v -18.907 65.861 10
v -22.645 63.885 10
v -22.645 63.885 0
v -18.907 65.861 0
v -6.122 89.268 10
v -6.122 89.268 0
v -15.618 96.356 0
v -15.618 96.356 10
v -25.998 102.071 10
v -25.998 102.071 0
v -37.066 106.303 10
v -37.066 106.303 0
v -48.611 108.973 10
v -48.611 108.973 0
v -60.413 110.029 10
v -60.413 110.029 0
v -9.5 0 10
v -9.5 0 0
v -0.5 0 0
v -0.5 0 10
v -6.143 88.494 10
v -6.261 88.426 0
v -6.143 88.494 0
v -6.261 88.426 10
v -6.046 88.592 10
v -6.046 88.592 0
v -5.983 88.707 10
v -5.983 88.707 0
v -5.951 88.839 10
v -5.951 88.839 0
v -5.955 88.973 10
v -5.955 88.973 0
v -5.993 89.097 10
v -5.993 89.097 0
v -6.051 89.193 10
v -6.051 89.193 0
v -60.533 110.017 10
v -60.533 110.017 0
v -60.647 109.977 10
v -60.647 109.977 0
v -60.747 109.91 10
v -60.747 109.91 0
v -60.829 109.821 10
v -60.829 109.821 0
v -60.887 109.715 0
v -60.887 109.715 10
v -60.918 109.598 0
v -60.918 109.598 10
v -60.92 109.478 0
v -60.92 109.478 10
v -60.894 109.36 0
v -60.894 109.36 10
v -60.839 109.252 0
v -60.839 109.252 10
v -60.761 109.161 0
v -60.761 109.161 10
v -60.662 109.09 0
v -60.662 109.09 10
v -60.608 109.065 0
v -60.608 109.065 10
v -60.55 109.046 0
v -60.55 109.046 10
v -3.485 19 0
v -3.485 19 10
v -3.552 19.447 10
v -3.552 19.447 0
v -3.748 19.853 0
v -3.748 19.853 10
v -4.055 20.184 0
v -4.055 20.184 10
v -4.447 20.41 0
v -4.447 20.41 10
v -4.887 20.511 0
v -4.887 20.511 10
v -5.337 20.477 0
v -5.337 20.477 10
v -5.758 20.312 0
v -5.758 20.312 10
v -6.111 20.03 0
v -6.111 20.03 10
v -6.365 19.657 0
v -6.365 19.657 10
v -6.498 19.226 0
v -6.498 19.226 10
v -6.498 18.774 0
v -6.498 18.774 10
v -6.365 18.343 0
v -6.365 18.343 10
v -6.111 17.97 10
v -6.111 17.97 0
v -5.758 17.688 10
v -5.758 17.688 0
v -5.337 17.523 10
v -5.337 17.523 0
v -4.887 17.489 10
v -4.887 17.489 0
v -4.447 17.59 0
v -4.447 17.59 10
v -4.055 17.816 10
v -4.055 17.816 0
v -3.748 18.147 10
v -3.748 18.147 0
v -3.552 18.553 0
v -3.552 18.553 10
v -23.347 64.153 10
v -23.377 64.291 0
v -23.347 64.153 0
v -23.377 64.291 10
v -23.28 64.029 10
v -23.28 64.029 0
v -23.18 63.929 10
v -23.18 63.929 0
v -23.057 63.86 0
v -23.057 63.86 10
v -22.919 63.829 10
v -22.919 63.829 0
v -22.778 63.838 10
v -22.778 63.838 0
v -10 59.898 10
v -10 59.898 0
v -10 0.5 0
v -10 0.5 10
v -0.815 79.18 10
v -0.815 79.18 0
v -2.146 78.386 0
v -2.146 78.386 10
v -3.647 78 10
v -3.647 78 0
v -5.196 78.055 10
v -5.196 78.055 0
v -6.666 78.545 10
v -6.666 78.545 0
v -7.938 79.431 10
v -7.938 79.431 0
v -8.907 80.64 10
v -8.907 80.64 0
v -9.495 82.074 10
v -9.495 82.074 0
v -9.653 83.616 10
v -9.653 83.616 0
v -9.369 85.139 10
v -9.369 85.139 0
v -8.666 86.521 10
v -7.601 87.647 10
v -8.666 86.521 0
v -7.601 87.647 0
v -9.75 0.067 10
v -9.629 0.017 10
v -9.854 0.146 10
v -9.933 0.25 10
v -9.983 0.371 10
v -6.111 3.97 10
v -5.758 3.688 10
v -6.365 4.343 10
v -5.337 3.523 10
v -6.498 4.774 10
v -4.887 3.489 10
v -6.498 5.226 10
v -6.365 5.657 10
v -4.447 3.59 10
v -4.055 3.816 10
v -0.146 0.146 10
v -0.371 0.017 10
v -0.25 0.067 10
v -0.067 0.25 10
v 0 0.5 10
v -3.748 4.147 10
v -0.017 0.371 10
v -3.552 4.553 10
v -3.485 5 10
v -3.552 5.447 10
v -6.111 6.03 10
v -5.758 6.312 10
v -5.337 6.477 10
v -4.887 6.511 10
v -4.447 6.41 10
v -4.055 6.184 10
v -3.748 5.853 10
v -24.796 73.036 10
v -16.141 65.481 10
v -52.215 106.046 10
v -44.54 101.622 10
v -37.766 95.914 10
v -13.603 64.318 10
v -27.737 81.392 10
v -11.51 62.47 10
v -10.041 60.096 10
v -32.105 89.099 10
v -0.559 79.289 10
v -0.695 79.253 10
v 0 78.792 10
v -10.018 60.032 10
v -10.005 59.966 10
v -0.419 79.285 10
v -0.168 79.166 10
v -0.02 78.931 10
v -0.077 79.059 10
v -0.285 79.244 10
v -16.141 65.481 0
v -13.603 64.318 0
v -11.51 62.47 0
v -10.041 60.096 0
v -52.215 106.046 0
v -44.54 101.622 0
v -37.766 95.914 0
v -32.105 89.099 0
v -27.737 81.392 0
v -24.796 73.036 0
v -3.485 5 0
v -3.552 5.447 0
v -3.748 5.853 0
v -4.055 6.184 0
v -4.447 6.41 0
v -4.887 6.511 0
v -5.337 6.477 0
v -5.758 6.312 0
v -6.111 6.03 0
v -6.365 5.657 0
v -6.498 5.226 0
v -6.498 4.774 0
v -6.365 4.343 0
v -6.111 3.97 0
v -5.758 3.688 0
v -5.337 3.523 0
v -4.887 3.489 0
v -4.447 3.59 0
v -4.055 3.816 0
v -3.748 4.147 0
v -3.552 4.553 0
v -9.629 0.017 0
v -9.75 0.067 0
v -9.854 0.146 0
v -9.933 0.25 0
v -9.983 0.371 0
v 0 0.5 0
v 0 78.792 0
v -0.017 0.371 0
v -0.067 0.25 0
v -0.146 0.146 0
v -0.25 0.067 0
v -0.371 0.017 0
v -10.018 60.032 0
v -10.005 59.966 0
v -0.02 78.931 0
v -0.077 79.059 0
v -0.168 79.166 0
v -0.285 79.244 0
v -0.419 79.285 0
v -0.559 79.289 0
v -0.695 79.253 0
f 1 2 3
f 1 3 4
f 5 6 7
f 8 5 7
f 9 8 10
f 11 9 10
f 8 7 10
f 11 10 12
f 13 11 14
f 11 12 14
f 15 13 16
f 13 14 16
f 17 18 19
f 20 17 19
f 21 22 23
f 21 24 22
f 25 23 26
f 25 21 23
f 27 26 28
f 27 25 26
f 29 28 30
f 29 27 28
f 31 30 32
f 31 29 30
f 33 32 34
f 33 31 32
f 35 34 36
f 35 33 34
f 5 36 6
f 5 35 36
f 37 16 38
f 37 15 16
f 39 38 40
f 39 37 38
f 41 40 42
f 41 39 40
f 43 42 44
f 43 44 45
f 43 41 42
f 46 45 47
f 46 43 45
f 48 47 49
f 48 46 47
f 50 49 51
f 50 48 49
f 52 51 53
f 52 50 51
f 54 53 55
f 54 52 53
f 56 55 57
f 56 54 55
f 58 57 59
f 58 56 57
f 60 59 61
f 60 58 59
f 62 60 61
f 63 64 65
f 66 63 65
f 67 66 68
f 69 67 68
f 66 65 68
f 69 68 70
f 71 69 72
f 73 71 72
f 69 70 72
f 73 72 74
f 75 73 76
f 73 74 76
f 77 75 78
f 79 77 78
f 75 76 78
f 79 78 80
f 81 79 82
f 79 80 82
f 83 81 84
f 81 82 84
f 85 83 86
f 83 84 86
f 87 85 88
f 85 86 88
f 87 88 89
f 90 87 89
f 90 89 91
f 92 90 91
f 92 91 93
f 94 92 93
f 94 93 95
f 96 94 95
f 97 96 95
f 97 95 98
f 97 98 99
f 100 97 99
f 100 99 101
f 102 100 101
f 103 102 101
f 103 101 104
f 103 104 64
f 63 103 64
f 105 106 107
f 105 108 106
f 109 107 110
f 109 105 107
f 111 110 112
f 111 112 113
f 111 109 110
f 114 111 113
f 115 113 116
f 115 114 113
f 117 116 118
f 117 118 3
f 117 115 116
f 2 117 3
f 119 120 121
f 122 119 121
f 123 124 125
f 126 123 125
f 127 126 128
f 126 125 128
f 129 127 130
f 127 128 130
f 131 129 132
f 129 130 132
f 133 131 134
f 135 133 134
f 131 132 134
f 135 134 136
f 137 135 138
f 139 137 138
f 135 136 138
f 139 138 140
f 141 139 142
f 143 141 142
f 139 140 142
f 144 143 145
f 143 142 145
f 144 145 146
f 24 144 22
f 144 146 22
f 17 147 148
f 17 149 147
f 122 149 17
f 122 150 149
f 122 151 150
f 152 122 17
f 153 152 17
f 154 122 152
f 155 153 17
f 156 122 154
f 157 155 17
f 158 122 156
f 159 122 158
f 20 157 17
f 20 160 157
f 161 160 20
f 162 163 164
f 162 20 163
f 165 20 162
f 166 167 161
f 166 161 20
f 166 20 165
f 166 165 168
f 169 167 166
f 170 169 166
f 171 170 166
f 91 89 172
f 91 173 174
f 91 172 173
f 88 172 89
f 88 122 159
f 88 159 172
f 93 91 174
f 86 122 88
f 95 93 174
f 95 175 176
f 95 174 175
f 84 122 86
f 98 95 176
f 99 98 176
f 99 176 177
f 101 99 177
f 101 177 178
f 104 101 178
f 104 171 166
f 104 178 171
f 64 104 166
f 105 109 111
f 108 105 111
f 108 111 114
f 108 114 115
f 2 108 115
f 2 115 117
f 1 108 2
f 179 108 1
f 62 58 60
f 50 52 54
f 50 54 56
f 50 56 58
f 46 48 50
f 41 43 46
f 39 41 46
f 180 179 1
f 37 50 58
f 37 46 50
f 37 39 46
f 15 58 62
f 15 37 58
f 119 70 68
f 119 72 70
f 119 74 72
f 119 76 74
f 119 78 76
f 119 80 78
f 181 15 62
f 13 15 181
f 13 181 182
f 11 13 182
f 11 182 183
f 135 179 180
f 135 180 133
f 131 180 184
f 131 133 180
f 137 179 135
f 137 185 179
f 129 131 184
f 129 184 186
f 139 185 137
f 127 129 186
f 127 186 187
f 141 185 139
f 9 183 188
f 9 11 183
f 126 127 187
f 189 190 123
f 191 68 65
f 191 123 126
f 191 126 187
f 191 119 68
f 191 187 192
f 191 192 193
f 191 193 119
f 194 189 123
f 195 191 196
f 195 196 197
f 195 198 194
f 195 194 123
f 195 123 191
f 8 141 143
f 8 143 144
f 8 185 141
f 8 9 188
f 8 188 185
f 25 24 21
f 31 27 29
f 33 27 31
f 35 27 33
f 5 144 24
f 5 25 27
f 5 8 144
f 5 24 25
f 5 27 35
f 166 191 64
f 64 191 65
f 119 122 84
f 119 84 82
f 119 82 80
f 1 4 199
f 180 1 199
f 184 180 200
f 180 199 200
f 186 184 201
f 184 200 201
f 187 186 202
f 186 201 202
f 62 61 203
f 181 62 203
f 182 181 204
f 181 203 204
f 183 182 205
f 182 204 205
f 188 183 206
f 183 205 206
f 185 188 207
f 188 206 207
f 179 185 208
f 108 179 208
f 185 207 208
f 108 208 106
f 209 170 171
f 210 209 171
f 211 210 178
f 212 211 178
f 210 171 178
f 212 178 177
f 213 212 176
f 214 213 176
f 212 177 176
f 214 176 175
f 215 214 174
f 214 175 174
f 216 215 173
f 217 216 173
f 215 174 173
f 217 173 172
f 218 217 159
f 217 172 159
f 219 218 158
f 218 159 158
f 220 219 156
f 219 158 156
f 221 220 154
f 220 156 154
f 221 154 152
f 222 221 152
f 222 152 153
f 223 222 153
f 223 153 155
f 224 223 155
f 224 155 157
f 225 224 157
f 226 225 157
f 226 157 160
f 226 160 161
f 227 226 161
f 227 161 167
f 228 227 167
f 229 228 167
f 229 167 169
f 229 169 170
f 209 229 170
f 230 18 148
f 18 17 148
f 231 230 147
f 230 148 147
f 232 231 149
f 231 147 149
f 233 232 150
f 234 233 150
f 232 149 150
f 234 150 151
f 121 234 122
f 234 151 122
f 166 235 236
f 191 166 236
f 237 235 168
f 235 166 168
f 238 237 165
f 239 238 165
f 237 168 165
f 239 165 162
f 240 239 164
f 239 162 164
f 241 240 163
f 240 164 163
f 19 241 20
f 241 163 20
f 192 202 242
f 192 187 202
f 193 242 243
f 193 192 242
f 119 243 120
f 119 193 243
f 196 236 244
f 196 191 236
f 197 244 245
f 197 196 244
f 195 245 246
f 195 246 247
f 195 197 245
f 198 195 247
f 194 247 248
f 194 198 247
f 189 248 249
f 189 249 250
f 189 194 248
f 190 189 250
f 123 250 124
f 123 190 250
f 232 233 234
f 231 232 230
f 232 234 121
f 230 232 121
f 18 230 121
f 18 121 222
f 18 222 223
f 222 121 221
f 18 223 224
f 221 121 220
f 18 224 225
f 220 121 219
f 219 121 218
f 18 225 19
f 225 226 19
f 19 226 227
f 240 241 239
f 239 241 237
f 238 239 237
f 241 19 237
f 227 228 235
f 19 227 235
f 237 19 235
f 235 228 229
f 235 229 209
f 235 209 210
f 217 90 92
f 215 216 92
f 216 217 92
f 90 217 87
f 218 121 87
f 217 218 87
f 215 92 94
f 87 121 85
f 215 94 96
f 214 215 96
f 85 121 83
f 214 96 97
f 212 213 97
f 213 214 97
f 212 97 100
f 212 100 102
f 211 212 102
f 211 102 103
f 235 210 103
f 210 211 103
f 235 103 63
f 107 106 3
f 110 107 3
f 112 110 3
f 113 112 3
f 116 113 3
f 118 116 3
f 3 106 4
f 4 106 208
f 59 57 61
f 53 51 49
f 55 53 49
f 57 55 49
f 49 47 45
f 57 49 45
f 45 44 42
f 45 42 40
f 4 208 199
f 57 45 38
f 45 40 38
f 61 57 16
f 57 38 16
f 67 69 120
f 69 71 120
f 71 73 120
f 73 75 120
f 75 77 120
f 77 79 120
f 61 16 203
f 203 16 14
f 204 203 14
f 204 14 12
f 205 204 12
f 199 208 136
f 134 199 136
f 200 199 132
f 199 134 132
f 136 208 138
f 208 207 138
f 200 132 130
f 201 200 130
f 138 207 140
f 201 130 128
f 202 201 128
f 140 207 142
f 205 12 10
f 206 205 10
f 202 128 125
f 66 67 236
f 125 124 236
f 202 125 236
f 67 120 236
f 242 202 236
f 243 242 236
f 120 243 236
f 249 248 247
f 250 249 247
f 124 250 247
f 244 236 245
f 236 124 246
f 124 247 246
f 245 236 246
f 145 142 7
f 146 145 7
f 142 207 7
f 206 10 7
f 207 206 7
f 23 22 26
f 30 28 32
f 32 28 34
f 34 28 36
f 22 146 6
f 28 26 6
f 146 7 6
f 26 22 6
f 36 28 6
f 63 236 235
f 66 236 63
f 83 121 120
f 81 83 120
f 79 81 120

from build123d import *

# Parameters (mm, degrees)
BOSS_EXTRUDE1_DEPTH = 10
FILLET1_R           = 0.5
SKETCH2_R           = 1.515
CUT_EXTRUDE1_DEPTH  = 127.166955858
FILLET2_R           = 0.5


with BuildPart() as part:
    # Sketch1 → Boss-Extrude1 (new body)
    with BuildSketch(Plane.XY):
        with BuildLine():
            Line((0, 0), (0, 80))
            ThreePointArc((0, 80), (-8.82808737, 80.510568582), (-5.446921008, 88.681463327))
            ThreePointArc((-5.446921008, 88.681463327), (-33.19088971, 105.018694036), (-65, 110))
            ThreePointArc((-65, 110), (-36.020401707, 94.064120743), (-23.327746863, 63.524541867))
            Line((-23.327746863, 63.524541867), (-18.907194485, 65.860931532))
            ThreePointArc((-18.907194485, 65.860931532), (-13.559533082, 64.289226454), (-10, 60))
            Line((-10, 60), (-10, 0))
            Line((-10, 0), (0, 0))
        make_face()
    extrude(amount=BOSS_EXTRUDE1_DEPTH)

    # Fillet1
    fillet1_edges = [part.edges().sort_by_distance(p)[0] for p in [
        (-10, 60, 5),
        (-23.327746863, 63.524541867, 5),
        (-65, 110, 5),
        (-5.446921008, 88.681463327, 5),
        (0, 80, 5),
    ]]
    fillet(fillet1_edges, radius=FILLET1_R)

    # Sketch2 → Cut-Extrude1 (cut, through all)
    with BuildSketch(Plane.XY.offset(10)):
        with Locations((-5, 5)):
            Circle(SKETCH2_R)
        with Locations((-5, 19)):
            Circle(SKETCH2_R)
    extrude(amount=-CUT_EXTRUDE1_DEPTH, mode=Mode.SUBTRACT)

    # Fillet2
    fillet2_edges = [part.edges().sort_by_distance(p)[0] for p in [
        (-10, 0, 5),
        (0, 0, 5),
    ]]
    fillet(fillet2_edges, radius=FILLET2_R)


solid = part.part
